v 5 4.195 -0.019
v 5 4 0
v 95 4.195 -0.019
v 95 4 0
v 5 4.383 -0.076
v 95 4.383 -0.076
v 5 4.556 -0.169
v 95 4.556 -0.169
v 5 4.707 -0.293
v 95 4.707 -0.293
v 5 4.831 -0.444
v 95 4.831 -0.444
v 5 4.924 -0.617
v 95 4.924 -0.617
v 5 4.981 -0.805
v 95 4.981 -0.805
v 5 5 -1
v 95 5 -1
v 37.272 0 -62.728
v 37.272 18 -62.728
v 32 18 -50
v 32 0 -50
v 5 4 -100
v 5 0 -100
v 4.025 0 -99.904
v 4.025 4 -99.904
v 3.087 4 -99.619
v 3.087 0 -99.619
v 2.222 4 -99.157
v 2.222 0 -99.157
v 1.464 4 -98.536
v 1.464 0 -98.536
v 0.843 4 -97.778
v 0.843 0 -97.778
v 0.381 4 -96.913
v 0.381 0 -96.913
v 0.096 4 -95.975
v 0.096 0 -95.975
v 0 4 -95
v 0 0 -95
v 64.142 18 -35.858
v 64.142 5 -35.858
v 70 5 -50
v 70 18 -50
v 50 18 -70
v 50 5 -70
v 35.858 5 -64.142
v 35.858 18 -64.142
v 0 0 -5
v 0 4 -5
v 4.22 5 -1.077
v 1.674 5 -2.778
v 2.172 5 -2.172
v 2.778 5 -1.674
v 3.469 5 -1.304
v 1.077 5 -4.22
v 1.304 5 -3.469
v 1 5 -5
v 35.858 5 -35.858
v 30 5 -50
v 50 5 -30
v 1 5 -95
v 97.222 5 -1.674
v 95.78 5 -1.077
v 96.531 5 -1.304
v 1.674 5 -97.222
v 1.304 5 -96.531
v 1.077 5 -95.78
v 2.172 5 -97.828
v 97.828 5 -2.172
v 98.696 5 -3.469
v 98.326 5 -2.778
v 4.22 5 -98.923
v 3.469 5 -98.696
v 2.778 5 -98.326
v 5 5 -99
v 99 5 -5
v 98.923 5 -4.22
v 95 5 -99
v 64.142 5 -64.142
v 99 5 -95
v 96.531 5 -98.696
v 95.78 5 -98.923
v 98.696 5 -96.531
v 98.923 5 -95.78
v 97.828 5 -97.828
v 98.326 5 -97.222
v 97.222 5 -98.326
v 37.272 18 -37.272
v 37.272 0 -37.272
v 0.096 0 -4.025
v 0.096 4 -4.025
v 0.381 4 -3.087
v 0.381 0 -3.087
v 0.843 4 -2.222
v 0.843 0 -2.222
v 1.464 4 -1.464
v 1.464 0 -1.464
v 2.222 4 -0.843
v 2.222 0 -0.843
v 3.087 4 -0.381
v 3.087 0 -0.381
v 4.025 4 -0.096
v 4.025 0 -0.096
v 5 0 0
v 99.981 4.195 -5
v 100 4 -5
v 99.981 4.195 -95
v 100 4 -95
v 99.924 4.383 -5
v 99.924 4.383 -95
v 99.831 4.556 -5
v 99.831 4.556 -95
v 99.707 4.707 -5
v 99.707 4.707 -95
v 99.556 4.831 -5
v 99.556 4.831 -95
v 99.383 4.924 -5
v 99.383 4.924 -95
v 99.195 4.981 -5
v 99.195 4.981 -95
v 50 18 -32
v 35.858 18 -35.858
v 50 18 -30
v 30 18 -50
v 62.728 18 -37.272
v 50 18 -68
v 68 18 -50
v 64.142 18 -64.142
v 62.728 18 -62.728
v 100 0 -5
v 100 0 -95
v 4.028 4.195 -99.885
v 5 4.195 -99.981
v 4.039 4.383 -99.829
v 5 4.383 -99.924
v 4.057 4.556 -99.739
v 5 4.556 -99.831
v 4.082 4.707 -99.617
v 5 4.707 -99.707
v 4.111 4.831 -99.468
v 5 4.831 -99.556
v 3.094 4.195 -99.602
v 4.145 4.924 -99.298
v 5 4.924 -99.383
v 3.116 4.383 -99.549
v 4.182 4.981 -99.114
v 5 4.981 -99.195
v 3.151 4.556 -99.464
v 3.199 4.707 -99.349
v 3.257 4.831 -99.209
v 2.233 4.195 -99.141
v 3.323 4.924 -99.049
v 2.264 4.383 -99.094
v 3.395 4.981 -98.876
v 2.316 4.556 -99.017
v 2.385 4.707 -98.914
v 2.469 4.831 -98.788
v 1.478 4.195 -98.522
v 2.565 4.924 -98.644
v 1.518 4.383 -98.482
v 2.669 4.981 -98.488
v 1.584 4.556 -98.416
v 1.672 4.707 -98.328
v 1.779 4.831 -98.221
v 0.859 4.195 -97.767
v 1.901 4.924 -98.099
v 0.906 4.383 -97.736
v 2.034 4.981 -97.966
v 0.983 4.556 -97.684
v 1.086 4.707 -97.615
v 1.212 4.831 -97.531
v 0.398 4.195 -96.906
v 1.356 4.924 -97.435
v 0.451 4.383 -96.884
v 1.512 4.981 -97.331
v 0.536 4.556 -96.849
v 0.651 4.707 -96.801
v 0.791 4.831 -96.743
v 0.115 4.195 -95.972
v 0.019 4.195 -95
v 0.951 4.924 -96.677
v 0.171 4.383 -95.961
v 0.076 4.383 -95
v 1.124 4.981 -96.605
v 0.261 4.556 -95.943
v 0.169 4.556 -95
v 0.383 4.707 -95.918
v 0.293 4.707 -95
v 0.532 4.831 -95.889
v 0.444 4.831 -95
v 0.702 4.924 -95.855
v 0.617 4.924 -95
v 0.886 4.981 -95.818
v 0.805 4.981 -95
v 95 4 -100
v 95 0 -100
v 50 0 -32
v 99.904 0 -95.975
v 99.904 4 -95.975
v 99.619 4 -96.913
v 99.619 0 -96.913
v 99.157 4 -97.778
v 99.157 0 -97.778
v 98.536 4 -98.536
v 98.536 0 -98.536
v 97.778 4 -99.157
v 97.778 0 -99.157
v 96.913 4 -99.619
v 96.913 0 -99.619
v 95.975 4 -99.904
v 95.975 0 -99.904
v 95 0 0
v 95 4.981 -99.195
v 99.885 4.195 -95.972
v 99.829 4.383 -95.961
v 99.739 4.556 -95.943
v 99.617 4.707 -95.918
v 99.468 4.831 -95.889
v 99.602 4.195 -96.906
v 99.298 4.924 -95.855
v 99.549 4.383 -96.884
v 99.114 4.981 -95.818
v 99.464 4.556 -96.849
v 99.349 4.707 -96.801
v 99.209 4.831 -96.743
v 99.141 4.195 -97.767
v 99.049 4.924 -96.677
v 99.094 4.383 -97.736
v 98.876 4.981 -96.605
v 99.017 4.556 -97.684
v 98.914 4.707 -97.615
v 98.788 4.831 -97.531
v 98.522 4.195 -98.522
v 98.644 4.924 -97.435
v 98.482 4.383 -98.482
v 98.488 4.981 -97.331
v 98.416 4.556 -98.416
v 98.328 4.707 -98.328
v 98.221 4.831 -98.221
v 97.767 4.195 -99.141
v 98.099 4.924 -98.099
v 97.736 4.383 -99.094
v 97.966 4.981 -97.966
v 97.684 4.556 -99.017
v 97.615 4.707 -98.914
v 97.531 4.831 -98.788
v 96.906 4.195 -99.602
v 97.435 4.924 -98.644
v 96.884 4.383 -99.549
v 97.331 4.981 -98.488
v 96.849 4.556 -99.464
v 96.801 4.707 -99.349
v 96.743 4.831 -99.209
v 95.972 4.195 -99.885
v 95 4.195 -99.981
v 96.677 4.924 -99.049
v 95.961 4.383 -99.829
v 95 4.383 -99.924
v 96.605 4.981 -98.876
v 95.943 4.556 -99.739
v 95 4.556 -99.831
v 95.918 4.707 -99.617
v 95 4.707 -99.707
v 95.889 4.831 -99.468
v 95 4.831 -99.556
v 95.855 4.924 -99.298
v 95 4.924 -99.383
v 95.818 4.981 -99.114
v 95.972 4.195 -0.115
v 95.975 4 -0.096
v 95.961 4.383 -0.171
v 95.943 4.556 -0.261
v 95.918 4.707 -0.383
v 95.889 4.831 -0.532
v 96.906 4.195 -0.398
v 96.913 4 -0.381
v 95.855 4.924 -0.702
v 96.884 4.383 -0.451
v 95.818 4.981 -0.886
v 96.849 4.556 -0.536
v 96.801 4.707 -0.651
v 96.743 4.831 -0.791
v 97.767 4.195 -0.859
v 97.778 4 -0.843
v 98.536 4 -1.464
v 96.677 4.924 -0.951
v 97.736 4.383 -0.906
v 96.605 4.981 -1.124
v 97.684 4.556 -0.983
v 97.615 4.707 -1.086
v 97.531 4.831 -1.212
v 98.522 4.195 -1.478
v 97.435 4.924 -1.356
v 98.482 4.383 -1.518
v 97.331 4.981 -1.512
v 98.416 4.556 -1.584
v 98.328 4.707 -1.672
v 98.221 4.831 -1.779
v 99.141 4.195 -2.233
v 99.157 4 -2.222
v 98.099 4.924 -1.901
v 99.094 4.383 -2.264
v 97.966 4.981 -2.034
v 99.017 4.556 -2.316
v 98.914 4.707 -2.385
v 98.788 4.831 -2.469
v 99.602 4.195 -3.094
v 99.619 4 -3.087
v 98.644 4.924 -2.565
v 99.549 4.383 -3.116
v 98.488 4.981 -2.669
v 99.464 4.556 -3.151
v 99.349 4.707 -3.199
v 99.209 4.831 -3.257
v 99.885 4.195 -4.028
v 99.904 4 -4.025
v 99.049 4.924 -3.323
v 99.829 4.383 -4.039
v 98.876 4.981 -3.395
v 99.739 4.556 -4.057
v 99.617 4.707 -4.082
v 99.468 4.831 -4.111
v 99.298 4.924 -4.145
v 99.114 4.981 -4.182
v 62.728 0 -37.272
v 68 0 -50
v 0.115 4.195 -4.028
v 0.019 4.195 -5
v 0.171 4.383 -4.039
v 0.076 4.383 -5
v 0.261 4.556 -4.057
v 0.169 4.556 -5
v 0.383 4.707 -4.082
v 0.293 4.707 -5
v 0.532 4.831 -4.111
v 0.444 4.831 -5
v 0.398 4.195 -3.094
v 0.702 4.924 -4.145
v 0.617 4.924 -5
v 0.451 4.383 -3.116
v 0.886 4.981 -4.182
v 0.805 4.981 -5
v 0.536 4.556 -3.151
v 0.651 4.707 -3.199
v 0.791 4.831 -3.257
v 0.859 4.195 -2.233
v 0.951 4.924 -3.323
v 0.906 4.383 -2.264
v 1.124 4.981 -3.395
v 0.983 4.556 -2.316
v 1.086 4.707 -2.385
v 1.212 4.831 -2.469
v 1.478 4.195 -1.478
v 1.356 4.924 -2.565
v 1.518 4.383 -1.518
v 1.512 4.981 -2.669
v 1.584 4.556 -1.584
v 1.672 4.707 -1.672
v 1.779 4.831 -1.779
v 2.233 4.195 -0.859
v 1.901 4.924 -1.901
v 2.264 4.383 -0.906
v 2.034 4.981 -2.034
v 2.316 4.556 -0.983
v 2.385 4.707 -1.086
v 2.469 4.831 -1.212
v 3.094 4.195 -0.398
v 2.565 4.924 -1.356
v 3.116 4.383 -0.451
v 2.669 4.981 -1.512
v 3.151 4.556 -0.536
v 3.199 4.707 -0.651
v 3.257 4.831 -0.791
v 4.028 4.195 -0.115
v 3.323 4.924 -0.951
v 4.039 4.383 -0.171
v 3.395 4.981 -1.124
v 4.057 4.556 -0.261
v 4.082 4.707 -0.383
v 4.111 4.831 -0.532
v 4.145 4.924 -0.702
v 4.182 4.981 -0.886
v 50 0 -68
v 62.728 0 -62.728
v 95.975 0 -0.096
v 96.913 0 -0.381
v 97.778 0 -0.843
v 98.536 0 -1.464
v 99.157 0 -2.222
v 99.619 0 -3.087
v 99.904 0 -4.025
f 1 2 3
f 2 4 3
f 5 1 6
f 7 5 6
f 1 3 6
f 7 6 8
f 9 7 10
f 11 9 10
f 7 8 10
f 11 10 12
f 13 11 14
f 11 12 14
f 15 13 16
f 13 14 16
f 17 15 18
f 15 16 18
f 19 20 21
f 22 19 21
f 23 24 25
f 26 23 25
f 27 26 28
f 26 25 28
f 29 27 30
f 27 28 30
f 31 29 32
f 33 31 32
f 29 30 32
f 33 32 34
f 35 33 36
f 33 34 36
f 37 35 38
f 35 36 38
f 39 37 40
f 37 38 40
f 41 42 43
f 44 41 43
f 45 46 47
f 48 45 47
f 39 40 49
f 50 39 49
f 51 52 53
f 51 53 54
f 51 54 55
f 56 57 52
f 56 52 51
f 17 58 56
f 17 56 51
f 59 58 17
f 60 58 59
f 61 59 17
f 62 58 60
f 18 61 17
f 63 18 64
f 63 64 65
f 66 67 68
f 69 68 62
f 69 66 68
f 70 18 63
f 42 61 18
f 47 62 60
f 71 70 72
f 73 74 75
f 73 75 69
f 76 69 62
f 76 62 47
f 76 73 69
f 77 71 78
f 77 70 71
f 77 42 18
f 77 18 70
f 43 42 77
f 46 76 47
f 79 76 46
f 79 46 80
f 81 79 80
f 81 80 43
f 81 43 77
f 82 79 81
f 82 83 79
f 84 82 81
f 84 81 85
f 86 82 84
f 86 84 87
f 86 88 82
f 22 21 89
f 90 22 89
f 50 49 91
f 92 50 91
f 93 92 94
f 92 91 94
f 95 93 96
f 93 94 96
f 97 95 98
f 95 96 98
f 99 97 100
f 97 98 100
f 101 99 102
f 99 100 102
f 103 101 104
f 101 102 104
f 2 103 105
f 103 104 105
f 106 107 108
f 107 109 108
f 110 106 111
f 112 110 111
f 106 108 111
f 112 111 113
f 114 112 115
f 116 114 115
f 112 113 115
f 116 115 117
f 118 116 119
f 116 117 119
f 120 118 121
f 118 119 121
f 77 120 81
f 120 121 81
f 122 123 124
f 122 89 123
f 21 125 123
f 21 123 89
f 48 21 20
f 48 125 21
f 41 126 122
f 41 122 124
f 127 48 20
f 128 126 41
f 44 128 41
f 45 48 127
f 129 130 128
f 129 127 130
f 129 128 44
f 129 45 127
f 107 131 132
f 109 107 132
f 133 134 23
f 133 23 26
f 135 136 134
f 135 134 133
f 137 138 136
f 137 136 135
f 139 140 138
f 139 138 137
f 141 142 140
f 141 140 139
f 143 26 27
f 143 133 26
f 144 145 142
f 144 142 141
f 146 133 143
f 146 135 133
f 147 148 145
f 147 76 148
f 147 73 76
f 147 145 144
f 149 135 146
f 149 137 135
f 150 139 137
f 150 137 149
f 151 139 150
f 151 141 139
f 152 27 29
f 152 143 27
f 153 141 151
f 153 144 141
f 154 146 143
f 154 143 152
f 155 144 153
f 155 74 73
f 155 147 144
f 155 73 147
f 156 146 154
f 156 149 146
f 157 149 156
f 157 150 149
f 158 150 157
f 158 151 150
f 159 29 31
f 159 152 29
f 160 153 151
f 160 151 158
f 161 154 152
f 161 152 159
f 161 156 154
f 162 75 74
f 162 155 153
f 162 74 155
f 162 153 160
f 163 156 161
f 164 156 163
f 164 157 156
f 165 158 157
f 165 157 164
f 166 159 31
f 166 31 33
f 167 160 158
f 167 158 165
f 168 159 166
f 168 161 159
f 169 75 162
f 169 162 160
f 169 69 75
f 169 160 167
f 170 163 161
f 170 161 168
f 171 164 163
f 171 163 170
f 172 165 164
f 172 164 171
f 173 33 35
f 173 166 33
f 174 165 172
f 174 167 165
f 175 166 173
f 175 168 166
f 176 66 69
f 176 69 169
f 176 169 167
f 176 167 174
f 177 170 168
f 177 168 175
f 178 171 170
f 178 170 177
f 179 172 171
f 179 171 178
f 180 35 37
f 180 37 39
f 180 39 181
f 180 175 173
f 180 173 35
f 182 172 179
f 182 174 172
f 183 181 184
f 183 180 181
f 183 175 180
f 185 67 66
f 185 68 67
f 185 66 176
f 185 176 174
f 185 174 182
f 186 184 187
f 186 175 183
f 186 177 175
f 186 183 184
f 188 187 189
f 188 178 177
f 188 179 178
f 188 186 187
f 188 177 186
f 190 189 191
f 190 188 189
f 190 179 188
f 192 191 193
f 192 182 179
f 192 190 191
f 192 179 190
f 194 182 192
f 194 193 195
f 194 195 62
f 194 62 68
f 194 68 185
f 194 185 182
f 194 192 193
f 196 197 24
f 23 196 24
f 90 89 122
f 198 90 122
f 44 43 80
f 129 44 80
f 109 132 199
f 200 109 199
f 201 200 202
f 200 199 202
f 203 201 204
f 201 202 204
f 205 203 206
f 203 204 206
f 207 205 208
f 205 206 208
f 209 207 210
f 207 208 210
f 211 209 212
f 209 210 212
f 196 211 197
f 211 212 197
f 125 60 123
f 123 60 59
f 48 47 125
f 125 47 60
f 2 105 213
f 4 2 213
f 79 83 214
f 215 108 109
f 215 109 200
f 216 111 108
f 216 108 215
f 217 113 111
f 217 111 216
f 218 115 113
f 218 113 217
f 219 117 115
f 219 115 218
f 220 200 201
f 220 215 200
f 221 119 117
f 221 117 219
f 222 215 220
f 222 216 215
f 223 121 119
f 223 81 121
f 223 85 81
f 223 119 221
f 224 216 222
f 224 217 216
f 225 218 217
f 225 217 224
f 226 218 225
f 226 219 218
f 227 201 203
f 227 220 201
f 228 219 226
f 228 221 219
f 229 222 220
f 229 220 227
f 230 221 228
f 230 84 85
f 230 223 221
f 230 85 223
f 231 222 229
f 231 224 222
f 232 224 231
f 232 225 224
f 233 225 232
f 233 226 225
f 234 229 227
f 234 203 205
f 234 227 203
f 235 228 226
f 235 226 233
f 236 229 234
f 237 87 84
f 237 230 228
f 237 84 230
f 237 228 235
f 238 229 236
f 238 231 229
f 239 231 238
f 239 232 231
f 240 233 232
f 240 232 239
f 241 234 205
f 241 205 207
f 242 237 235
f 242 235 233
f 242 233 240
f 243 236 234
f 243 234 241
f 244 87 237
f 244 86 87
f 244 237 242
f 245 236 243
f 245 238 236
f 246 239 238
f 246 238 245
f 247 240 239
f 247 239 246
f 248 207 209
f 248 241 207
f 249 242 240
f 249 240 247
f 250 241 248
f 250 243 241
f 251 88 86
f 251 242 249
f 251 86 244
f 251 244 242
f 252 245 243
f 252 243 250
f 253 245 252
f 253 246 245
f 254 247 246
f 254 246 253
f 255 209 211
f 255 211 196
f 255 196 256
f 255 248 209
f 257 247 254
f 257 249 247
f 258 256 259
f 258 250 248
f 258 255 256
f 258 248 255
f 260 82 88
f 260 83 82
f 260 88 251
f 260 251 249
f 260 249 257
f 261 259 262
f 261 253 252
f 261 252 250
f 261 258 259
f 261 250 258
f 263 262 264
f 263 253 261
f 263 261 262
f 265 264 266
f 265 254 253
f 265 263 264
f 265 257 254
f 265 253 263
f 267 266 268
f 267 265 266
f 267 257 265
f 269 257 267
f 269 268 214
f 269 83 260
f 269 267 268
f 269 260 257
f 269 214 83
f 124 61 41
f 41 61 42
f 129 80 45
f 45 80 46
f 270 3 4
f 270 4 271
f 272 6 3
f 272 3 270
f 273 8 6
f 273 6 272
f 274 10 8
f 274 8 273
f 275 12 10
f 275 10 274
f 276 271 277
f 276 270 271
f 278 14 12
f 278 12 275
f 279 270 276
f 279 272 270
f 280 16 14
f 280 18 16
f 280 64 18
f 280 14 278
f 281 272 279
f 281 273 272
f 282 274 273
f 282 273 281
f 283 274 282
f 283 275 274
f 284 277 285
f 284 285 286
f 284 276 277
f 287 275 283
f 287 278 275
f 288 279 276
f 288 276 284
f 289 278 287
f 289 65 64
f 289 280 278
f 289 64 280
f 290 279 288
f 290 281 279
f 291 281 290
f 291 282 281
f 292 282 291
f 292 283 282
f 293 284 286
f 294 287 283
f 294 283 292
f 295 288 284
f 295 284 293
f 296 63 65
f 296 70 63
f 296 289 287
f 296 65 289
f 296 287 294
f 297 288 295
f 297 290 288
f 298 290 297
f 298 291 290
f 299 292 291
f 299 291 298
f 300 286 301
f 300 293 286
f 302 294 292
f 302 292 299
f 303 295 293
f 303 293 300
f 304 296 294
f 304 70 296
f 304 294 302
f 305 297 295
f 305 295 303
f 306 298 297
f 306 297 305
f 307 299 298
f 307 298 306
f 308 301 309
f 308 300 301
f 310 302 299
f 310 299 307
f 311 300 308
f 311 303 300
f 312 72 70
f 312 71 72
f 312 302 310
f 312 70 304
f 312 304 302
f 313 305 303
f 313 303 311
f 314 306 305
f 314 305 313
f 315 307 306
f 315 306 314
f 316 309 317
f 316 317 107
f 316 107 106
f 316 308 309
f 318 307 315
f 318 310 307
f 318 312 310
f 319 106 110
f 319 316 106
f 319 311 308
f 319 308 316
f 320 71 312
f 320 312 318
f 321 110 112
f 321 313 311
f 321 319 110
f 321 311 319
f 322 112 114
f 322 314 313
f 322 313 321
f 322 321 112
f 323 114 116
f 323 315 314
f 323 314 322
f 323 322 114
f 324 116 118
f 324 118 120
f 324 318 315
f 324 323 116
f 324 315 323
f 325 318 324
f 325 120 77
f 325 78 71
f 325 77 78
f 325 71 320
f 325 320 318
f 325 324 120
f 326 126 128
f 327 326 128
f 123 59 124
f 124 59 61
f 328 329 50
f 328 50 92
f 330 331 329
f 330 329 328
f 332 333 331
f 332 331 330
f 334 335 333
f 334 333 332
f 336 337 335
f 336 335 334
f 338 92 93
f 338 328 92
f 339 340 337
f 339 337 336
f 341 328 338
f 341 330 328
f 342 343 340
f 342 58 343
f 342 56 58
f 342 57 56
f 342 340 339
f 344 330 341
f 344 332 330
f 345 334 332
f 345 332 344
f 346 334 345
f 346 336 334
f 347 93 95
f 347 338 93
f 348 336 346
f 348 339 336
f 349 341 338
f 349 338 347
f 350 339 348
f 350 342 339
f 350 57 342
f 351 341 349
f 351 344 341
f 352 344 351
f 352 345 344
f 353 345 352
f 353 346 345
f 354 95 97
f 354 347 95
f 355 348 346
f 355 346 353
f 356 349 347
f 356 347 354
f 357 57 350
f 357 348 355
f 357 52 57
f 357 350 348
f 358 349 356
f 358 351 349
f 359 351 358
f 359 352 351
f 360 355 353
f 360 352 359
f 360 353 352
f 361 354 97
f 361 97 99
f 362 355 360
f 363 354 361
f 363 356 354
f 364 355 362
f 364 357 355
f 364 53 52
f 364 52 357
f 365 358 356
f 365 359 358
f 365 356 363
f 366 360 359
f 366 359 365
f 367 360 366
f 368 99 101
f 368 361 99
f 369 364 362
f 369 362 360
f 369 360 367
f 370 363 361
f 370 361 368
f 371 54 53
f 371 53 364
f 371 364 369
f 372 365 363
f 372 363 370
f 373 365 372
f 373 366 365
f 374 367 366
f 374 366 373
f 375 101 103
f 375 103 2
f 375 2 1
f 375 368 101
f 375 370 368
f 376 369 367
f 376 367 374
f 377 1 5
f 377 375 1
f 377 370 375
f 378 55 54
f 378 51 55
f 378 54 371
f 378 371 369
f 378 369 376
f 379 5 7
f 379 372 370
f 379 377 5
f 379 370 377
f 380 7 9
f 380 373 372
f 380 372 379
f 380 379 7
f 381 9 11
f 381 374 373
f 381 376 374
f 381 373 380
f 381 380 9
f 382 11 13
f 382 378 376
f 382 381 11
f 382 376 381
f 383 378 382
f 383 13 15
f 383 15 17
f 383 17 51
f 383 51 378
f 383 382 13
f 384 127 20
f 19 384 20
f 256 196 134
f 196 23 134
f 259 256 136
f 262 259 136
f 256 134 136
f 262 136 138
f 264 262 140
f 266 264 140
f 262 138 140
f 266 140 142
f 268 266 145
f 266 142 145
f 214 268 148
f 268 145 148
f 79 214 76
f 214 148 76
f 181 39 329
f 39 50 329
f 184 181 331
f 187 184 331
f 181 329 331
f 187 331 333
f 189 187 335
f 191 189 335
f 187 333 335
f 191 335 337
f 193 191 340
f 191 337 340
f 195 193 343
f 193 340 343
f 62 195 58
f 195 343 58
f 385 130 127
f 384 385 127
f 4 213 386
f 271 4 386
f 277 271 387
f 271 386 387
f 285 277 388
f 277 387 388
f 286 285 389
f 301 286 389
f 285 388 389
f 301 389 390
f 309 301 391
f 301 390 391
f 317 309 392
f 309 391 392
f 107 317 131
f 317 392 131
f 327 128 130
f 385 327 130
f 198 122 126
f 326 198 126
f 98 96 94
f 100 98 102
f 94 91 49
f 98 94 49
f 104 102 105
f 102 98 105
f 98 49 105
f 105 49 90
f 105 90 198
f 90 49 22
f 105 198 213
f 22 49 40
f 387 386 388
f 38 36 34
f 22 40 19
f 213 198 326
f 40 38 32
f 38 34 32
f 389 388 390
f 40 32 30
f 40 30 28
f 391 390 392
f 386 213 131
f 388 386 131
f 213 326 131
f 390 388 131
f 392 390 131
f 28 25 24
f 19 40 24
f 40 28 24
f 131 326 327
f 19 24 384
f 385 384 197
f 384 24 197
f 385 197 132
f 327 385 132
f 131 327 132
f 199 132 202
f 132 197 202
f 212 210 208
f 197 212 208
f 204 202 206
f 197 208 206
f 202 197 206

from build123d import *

# Parameters (mm, degrees)
BOSS_EXTRUDE1_DEPTH = 5
FILLET1_R           = 1
BOSS_EXTRUDE2_DEPTH = 13
CUT_EXTRUDE1_DEPTH  = 143.017604543


with BuildPart() as part:
    # Sketch1 → Boss-Extrude1 (new body)
    with BuildSketch(Plane(origin=(0, 0, 0), x_dir=(1, 0, 0), z_dir=(0, 1, 0))):
        with BuildLine():
            Line((5, 0), (95, 0))
            ThreePointArc((95, 0), (98.535533906, 1.464466094), (100, 5))
            Line((100, 5), (100, 95))
            ThreePointArc((100, 95), (98.535533906, 98.535533906), (95, 100))
            Line((95, 100), (5, 100))
            ThreePointArc((5, 100), (1.464466094, 98.535533906), (0, 95))
            Line((0, 95), (0, 5))
            ThreePointArc((0, 5), (1.464466094, 1.464466094), (5, 0))
        make_face()
    extrude(amount=BOSS_EXTRUDE1_DEPTH)

    # Fillet1
    fillet1_edges = [part.edges().sort_by_distance(p)[0] for p in [
        (1.464466094, 5, -98.535533906),
        (0, 5, -50),
        (1.464466094, 5, -1.464466094),
        (50, 5, 0),
        (98.535533906, 5, -1.464466094),
        (100, 5, -50),
        (98.535533906, 5, -98.535533906),
        (50, 5, -100),
    ]]
    fillet(fillet1_edges, radius=FILLET1_R)

    # Sketch2 → Boss-Extrude2 (add)
    with BuildSketch(Plane(origin=(0, 5, 0), x_dir=(1, 0, 0), z_dir=(0, 1, 0))):
        Polygon((70, 50), (64.142135624, 64.142135624), (50, 70), (35.857864376, 64.142135624), (30, 50), (35.857864376, 35.857864376), (50, 30), (64.142135624, 35.857864376), align=None)
        Polygon((68, 50), (62.727922061, 62.727922061), (50, 68), (37.272077939, 62.727922061), (32, 50), (37.272077939, 37.272077939), (50, 32), (62.727922061, 37.272077939), align=None, mode=Mode.SUBTRACT)
    extrude(amount=BOSS_EXTRUDE2_DEPTH)

    # Sketch5 → Cut-Extrude1 (cut, through all)
    with BuildSketch(Plane(origin=(0, 5, 0), x_dir=(1, 0, 0), z_dir=(0, 1, 0))):
        Polygon((68, 50), (62.727922061, 62.727922061), (50, 68), (37.272077939, 62.727922061), (32, 50), (37.272077939, 37.272077939), (50, 32), (62.727922061, 37.272077939), align=None)
    extrude(amount=-CUT_EXTRUDE1_DEPTH, mode=Mode.SUBTRACT)


solid = part.part
